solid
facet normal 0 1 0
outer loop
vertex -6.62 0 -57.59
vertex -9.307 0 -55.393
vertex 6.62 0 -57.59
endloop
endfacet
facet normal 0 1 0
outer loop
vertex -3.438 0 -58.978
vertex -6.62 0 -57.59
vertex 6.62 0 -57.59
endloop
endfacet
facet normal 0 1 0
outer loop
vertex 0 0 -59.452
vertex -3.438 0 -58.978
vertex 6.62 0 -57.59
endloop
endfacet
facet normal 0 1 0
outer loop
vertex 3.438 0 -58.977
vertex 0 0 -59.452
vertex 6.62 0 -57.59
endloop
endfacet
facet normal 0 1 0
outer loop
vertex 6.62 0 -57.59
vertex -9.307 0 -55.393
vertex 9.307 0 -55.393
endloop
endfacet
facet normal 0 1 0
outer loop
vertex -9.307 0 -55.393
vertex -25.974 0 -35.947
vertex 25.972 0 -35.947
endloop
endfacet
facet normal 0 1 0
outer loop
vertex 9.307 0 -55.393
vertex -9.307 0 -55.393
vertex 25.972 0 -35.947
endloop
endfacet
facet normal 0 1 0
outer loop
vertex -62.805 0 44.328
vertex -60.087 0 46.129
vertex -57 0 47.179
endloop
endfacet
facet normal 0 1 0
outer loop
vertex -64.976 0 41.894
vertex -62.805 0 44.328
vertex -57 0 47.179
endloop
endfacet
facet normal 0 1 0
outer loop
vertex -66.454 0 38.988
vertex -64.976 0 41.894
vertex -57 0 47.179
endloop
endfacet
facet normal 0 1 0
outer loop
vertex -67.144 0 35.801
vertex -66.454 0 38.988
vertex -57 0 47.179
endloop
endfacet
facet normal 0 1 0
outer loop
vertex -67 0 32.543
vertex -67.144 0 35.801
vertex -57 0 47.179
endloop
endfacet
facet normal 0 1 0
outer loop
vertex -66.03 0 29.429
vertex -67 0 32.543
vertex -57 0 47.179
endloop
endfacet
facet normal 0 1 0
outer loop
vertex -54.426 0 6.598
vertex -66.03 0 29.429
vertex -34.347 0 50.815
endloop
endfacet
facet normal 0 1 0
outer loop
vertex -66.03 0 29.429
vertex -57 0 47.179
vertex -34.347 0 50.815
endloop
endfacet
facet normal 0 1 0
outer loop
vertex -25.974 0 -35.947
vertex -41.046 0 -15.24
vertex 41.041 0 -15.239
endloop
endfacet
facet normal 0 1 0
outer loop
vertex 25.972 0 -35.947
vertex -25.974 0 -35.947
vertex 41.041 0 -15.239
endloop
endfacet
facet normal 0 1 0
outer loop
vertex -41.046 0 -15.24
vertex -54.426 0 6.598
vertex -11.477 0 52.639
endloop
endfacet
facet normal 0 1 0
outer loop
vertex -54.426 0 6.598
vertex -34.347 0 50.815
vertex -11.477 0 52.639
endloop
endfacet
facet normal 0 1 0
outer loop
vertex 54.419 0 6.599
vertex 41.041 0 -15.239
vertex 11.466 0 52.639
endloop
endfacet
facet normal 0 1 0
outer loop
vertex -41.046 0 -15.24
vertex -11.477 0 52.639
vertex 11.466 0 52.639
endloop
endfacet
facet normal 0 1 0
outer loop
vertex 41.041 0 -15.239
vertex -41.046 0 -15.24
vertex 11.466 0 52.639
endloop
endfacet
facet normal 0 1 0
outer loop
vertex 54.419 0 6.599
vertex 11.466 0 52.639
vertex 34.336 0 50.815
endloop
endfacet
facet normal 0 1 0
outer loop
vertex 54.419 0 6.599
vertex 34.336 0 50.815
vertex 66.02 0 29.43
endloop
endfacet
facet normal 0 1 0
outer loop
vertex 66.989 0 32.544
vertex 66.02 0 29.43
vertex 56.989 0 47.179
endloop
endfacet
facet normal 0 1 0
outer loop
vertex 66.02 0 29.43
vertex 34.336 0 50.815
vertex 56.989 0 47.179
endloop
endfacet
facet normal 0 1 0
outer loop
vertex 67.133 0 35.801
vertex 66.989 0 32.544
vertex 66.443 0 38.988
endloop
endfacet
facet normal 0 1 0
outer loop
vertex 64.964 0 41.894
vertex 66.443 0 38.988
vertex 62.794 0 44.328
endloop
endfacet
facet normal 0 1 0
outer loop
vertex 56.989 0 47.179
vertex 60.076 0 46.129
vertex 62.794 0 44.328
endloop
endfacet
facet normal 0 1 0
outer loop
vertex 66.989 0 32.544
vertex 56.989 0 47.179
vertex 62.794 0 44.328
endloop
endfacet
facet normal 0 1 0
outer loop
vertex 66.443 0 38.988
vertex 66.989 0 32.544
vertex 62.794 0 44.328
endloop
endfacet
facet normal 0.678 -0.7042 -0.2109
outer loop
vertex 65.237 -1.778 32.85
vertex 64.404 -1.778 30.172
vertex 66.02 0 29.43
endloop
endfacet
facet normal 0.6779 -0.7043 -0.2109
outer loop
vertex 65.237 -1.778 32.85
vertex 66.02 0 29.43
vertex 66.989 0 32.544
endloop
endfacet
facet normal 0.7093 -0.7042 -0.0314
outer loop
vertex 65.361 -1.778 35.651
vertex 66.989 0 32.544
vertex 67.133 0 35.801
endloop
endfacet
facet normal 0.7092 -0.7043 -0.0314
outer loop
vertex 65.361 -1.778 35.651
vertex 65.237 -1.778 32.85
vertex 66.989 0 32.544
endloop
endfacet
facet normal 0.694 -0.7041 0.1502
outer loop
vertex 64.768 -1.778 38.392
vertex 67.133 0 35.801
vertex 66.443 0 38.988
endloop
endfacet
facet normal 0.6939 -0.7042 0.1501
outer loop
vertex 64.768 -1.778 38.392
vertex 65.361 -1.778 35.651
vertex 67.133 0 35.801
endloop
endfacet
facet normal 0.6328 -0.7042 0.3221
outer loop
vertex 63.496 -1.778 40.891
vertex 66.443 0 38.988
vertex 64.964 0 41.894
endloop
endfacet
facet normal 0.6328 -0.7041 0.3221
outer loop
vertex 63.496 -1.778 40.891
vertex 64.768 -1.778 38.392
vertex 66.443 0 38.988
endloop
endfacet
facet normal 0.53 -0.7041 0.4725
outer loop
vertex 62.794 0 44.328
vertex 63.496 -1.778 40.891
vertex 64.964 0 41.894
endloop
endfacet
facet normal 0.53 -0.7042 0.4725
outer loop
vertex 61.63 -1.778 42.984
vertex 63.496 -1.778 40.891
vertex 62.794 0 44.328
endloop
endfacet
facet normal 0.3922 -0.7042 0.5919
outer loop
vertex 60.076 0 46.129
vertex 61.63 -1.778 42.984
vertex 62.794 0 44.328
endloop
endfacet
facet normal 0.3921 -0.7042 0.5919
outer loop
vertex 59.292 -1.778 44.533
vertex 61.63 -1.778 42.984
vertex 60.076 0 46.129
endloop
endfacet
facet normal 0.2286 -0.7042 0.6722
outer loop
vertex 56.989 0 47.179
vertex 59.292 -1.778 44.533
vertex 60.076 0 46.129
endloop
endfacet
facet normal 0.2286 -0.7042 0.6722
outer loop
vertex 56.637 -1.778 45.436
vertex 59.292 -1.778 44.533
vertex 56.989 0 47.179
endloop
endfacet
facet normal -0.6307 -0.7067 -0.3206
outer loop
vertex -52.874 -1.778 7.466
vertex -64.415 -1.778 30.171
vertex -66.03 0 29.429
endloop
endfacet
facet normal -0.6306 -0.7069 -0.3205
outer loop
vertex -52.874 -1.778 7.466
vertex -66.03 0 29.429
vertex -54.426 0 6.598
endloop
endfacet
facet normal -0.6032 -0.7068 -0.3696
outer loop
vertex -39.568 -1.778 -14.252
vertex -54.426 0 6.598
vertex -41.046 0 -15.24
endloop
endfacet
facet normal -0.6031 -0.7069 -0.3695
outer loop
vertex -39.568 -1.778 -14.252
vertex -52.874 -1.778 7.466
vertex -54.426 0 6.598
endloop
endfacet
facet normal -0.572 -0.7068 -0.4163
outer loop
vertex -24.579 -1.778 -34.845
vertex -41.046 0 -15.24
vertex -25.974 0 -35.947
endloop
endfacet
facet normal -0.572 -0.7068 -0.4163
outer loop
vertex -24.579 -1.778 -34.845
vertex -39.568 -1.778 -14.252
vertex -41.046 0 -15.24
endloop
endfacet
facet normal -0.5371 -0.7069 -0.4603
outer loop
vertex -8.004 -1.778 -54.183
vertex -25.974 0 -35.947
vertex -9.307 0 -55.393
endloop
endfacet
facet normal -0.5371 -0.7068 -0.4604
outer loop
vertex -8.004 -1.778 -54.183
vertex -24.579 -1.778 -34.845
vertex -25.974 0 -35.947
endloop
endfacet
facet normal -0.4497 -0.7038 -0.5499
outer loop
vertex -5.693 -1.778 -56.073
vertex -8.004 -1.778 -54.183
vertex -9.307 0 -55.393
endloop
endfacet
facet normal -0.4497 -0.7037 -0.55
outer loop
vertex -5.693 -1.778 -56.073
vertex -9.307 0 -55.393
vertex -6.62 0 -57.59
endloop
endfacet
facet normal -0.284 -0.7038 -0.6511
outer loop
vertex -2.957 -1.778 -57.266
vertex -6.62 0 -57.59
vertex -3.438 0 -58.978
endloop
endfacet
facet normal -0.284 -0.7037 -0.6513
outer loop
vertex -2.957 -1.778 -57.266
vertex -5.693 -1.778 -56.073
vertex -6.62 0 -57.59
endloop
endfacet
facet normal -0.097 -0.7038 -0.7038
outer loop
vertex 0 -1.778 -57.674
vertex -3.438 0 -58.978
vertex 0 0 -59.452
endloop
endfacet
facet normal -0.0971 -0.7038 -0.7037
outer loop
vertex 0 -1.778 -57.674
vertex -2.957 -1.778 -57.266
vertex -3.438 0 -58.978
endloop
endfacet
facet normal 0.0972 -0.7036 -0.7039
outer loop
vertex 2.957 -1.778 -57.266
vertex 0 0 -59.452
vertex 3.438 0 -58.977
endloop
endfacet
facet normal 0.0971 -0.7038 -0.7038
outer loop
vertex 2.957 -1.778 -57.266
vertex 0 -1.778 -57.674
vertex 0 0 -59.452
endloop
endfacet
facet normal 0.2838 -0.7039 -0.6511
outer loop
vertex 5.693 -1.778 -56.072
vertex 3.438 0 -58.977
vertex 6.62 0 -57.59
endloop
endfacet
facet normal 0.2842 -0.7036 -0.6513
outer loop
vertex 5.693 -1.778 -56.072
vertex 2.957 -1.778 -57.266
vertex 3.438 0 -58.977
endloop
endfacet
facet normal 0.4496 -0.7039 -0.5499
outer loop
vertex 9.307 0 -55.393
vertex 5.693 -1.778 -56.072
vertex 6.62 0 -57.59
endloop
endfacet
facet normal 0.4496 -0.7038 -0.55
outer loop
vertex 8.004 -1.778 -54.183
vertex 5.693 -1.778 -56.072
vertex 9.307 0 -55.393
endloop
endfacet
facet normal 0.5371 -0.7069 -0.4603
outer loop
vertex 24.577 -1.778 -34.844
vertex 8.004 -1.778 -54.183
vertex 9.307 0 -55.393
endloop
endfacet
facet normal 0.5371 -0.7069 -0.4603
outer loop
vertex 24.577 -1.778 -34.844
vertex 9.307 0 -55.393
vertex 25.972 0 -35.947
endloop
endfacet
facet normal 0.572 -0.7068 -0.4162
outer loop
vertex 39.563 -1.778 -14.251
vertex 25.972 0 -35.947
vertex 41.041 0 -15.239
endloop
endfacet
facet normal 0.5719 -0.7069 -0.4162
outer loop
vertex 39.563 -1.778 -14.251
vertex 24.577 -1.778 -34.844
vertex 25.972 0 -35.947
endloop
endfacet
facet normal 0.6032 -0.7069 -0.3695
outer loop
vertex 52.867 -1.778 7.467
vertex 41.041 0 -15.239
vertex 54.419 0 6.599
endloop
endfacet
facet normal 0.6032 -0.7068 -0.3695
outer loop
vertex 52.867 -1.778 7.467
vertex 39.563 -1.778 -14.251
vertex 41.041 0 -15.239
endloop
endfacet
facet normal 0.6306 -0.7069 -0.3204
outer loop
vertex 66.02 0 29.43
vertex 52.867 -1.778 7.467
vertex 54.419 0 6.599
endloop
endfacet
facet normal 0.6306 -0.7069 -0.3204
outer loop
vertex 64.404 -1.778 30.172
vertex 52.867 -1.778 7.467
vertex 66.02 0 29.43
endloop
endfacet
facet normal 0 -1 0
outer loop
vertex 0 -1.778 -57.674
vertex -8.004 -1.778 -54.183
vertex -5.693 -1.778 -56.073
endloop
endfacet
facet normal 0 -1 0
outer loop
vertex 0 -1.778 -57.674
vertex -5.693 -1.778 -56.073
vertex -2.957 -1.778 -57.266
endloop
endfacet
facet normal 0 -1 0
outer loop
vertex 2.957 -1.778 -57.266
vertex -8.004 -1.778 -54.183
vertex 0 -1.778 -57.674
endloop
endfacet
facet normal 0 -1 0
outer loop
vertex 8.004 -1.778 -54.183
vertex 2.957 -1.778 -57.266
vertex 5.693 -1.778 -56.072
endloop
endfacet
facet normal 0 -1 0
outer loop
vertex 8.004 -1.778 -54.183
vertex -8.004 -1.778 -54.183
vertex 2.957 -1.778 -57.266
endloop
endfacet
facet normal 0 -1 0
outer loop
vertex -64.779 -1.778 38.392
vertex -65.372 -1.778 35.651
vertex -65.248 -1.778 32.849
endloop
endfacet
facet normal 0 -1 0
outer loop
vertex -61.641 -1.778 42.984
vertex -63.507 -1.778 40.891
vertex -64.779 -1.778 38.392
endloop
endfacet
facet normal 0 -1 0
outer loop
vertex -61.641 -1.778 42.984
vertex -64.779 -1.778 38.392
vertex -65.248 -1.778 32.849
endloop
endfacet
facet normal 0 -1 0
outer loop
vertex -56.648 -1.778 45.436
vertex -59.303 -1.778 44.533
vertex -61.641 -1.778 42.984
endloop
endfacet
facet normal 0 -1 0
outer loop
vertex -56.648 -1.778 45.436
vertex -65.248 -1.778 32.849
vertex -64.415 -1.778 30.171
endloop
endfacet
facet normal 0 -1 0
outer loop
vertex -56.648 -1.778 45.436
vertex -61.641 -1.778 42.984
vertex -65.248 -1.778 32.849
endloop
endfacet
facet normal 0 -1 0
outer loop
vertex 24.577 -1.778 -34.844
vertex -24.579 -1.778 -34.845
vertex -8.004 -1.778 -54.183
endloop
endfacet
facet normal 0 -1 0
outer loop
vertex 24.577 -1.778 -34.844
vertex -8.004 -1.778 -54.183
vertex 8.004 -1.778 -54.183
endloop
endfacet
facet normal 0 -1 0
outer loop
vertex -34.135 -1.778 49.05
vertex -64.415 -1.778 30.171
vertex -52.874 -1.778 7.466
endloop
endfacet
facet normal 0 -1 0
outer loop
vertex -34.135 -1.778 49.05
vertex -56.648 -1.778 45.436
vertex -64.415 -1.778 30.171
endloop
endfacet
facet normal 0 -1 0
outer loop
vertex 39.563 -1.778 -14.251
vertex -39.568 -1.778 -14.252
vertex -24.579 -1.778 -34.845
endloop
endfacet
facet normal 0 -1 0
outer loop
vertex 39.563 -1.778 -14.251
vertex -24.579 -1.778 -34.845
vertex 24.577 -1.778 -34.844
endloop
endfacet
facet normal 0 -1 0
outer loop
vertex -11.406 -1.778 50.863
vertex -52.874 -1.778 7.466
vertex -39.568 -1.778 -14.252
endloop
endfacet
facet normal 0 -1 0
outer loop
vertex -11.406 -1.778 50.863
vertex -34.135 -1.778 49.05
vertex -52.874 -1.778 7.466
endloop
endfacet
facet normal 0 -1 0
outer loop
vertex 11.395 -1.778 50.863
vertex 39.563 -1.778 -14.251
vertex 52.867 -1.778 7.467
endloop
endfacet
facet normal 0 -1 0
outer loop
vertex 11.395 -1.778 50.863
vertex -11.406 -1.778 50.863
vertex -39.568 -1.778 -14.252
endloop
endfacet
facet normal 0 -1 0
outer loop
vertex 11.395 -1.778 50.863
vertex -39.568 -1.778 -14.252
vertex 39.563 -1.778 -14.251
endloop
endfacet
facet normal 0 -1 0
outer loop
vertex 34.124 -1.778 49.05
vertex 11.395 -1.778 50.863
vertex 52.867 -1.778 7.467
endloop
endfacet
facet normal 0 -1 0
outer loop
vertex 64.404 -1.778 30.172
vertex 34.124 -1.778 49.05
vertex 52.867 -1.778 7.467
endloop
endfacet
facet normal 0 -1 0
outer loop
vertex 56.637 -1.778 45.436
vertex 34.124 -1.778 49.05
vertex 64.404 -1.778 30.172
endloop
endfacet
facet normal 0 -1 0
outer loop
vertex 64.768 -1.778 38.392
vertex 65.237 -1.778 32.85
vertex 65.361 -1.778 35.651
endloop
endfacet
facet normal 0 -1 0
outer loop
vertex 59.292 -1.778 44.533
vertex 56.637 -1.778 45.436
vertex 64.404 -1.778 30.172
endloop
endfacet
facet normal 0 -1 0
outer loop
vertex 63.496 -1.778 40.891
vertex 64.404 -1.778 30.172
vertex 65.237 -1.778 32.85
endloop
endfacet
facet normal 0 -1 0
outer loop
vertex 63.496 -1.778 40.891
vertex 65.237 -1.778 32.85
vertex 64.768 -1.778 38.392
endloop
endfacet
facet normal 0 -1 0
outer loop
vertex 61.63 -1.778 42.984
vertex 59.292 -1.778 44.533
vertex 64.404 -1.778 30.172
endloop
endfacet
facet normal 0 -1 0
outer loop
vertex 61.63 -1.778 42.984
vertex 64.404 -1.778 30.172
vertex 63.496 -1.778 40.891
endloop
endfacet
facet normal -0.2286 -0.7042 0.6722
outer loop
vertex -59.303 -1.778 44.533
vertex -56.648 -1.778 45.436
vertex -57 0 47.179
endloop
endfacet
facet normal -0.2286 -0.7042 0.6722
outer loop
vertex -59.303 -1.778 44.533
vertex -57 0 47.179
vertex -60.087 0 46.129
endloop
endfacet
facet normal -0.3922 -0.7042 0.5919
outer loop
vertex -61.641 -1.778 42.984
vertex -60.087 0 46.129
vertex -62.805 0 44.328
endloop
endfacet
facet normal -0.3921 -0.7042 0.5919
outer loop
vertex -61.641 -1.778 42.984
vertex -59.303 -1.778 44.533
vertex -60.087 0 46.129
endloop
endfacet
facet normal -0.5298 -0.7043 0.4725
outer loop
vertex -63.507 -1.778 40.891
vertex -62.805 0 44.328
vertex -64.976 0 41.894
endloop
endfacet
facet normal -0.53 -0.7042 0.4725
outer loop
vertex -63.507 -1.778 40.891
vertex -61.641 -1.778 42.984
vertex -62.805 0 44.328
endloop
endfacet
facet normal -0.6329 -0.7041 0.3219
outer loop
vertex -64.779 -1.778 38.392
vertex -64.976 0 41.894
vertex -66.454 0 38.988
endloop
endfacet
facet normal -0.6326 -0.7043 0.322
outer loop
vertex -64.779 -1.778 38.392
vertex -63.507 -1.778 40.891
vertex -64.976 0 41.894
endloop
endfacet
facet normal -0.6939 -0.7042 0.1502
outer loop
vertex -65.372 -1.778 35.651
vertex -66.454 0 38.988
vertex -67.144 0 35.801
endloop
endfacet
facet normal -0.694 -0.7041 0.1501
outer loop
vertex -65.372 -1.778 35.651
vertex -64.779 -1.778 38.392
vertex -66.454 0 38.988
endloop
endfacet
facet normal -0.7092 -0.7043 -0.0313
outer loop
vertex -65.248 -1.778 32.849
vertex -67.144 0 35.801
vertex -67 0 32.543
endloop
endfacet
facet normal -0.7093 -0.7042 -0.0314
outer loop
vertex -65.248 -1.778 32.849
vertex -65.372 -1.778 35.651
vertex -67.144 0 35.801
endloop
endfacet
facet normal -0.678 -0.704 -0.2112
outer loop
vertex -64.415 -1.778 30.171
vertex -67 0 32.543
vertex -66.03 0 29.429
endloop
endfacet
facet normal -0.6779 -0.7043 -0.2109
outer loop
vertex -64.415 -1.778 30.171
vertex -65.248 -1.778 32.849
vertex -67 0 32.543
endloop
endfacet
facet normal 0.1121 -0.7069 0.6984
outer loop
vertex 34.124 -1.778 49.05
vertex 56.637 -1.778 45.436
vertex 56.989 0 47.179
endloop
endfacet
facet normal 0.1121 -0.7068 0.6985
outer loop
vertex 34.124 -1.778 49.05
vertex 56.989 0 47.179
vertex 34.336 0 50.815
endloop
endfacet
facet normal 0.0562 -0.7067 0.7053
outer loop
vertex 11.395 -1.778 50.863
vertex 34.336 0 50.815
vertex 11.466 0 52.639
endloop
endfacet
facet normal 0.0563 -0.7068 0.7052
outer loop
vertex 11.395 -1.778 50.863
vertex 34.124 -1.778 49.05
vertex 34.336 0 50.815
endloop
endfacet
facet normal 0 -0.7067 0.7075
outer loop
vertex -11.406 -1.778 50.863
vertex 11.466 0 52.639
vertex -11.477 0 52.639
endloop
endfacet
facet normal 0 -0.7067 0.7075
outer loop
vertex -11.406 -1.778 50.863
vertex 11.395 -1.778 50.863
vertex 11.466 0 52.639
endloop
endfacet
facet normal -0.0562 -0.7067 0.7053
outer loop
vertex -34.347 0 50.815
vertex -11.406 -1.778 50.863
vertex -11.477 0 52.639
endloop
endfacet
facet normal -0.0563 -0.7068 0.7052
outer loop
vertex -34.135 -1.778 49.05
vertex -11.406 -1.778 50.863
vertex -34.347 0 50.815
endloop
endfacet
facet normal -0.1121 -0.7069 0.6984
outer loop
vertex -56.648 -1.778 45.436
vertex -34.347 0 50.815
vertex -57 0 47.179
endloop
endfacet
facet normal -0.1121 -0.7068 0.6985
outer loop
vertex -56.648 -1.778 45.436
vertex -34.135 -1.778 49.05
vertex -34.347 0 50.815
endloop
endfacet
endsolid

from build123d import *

# Parameters (mm, degrees)
F1_DEPTH = 1.778
F2_SIZE  = 1.77799


# Not quite as in the source:
# - a fillet or chamfer is up to 0.001 mm smaller than in the source, because OpenCascade refuses the exact size


with BuildPart() as f1:
    # F0 (on Front) → F1 (new body)
    with BuildSketch(Plane.XZ):
        with BuildLine():
            ThreePointArc((66.0201128793, 29.4303813325), (65.7972189254, 40.488980065), (56.9887202123, 47.1787213202))
            ThreePointArc((56.9887202123, 47.1787213202), (-0.0054733282, 52.8677532198), (-56.9996870512, 47.1789235179))
            ThreePointArc((-56.9996870512, 47.1789235179), (-65.8085669907, 40.4885109251), (-66.0304847763, 29.4291827833))
            ThreePointArc((-66.0304847763, 29.4291827833), (-41.0456047225, -15.2401883532), (-9.3070649286, -55.3931713157))
            ThreePointArc((-9.3070649286, -55.3931713157), (0.0001097607, -59.4518124354), (9.3070583612, -55.392652894))
            ThreePointArc((9.3070583612, -55.392652894), (41.0411349867, -15.2393801728), (66.0201128793, 29.4303813325))
        make_face()
    extrude(amount=F1_DEPTH)

    # F2 (size 1.778 in the source; OpenCascade refuses exactly that, so slightly less here)
    f2_edges = [f1.edges().sort_by_distance(p)[0] for p in [
        (-41.045605, -1.778, -15.240188),
    ]]
    chamfer(f2_edges, length=F2_SIZE)


solid = f1.part
